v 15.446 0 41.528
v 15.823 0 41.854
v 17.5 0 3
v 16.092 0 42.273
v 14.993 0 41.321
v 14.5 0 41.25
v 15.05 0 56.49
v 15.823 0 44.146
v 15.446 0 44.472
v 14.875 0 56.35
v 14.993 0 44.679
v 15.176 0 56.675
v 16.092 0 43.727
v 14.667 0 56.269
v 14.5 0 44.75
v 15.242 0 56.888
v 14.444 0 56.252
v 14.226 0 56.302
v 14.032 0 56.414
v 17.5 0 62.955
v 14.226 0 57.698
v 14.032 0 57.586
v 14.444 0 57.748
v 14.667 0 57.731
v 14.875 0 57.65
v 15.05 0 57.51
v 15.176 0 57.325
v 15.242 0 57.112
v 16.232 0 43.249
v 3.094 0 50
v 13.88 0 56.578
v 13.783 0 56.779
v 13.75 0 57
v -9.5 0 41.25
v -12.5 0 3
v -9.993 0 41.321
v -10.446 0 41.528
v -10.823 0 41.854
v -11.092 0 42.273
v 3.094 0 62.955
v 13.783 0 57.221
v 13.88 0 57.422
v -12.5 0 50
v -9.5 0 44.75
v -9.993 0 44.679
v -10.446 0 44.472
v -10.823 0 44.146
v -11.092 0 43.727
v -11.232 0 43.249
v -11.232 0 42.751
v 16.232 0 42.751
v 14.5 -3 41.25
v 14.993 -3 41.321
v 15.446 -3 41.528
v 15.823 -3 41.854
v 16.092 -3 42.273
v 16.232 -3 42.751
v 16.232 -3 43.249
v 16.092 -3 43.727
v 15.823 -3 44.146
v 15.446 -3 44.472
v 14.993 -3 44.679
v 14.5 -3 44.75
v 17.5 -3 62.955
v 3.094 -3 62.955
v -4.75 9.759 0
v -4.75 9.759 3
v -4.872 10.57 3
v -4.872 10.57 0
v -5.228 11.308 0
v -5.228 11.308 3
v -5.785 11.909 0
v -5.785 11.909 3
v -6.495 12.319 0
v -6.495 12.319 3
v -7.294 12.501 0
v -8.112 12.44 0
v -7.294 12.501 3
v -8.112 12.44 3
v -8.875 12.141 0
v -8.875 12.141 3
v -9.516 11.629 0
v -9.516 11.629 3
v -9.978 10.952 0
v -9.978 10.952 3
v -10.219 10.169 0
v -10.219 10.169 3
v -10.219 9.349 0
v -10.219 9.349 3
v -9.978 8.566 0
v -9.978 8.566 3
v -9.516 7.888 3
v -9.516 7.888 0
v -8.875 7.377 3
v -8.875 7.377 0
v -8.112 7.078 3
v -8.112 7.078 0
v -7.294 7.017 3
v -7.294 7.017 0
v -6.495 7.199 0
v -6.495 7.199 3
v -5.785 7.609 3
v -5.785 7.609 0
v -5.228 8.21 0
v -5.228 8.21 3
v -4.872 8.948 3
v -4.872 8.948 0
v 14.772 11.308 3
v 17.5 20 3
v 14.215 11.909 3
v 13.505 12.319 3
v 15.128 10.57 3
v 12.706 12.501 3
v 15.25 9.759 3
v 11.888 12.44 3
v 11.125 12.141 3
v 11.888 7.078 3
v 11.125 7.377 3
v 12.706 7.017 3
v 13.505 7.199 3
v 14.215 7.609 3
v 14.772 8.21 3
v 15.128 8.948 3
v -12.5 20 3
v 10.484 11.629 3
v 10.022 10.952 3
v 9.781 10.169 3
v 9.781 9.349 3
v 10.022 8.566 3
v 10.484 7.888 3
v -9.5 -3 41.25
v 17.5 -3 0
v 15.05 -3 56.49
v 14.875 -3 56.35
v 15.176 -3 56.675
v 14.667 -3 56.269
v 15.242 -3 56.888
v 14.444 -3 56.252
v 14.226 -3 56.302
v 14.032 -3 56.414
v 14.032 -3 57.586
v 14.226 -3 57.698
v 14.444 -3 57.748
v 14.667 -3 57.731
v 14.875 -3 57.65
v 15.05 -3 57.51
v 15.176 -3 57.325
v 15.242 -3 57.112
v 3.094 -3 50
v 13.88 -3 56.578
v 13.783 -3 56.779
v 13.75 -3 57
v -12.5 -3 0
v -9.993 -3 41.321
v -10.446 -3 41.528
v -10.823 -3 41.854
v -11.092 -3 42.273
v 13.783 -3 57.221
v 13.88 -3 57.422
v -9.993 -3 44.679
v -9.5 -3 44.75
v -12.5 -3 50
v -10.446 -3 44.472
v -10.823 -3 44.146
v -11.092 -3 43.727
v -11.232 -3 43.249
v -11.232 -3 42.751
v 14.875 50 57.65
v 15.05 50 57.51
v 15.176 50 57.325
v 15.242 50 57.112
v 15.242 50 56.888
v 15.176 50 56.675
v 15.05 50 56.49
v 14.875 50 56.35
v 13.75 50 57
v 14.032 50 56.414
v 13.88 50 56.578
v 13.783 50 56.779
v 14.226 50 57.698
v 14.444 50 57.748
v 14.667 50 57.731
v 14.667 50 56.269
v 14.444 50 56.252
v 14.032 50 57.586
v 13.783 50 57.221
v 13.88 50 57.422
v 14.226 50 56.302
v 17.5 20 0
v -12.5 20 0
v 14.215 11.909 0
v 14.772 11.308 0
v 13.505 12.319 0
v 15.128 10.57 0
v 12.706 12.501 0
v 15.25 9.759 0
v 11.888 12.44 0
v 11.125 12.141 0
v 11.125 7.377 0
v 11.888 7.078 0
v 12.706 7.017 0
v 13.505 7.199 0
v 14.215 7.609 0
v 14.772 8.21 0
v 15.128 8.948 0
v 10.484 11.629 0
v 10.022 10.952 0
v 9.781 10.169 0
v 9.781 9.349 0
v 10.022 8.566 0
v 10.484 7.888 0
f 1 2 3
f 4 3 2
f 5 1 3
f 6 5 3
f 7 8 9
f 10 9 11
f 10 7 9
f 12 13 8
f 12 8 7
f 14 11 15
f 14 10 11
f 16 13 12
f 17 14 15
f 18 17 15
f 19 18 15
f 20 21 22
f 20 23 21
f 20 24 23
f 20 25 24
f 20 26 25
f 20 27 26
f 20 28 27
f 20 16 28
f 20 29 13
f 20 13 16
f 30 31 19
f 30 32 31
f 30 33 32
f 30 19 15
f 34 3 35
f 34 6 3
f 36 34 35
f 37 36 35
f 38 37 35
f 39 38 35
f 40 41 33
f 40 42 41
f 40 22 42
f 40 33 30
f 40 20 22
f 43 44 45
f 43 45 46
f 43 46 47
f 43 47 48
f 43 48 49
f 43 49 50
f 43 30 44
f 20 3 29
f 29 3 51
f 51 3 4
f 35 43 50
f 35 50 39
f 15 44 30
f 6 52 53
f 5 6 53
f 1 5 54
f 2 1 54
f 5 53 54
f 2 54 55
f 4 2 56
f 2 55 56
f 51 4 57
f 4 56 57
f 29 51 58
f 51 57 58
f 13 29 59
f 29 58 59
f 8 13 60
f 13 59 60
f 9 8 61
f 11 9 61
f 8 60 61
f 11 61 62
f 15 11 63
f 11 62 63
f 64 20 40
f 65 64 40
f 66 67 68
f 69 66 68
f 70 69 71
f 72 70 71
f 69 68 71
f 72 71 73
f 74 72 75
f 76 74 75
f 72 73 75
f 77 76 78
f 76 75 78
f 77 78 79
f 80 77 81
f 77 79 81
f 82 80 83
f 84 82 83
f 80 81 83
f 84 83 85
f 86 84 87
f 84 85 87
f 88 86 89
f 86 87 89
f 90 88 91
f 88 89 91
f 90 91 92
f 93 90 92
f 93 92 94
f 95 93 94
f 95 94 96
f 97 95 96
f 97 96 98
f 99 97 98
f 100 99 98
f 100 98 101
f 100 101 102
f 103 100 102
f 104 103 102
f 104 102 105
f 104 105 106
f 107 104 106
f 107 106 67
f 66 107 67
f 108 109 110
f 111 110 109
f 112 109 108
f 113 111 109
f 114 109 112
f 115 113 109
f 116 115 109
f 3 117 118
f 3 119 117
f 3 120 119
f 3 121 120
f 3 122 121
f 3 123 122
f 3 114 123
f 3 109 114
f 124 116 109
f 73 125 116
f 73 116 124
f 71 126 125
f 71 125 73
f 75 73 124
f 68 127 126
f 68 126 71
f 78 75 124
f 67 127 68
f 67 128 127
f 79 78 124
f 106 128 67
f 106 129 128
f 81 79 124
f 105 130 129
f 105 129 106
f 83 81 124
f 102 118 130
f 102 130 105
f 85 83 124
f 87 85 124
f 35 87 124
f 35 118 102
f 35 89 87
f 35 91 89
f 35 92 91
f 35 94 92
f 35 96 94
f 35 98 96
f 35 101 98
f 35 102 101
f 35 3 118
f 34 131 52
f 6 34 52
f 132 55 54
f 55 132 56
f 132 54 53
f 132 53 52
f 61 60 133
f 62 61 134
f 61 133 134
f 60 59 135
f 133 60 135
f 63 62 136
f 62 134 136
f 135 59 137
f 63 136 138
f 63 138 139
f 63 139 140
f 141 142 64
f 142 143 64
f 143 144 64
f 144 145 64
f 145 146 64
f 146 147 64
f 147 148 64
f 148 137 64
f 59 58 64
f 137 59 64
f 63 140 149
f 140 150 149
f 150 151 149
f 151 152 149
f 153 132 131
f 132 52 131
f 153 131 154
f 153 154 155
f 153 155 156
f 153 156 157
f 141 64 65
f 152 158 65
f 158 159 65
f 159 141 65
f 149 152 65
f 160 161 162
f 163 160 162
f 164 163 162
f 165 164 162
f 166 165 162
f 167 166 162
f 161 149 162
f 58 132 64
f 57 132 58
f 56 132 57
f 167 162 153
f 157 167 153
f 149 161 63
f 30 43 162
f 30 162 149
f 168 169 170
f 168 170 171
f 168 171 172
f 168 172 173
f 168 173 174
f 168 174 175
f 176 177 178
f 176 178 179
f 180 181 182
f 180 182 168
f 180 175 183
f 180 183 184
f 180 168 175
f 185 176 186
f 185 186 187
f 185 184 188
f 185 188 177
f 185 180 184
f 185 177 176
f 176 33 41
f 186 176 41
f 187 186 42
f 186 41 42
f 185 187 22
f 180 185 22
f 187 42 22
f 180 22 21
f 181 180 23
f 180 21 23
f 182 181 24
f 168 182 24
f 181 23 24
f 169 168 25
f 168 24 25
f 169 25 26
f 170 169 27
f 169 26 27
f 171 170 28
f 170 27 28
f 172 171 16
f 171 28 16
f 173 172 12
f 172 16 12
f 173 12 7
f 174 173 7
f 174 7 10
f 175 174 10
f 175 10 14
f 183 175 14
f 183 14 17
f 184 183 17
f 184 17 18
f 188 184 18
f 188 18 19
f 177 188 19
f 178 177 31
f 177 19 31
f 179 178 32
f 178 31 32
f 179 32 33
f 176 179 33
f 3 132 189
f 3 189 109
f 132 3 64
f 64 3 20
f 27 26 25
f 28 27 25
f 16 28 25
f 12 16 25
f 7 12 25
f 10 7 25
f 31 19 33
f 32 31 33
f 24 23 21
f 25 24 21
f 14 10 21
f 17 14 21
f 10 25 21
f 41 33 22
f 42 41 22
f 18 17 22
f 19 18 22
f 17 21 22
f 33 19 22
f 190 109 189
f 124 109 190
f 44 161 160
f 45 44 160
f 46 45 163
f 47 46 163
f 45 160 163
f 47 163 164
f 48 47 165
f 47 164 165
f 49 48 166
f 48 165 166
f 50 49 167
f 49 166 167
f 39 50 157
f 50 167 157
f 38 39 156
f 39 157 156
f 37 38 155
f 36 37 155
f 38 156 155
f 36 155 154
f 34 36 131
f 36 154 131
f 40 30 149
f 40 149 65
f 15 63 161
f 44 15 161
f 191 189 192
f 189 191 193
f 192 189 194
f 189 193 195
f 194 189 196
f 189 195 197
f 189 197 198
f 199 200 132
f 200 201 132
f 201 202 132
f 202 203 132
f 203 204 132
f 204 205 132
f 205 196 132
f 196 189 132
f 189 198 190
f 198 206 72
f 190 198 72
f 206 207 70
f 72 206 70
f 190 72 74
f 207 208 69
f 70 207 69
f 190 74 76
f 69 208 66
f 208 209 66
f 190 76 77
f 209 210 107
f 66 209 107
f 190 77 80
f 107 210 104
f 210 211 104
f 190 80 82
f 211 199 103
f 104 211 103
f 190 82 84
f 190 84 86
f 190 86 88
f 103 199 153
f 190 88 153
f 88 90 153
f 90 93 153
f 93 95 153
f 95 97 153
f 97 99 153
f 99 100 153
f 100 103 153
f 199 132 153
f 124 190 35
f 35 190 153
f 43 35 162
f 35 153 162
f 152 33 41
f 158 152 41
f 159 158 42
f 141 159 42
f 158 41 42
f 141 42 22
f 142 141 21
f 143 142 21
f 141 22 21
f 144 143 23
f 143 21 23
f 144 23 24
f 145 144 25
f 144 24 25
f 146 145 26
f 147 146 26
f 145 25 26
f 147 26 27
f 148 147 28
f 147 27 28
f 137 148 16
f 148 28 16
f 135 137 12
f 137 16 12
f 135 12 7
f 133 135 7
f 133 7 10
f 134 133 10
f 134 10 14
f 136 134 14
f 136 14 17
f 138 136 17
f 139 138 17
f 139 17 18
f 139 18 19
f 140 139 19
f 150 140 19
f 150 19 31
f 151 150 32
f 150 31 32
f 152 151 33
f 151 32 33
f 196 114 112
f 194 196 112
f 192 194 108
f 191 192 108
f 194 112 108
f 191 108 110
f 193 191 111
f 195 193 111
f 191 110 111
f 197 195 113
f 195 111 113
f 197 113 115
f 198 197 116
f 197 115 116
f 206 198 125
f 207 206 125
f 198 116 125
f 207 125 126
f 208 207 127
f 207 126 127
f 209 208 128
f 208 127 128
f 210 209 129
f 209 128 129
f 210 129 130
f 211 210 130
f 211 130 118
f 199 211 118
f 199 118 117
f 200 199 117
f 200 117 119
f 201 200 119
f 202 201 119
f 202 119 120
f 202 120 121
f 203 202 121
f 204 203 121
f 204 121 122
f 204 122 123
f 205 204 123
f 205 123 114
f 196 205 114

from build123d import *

# Parameters (mm, degrees)
F0_W      = 30
F0_H      = 50
F1_DEPTH  = 3
F2_W      = 30
F2_H      = 3
F3_DEPTH  = 20
F4_R      = 2.75
F5_DEPTH  = 3.001
F7_DEPTH  = 23.001
F8_W      = 14.4057143981
F8_H      = 12.954934624
F8_R      = 0.75
F9_DEPTH  = 3
F10_R     = 0.75
F11_DEPTH = 50


with BuildPart() as f1:
    # F0 (on Front) → F1 (new body)
    with BuildSketch(Plane.XZ):
        with Locations((2.5, 25)):
            Rectangle(F0_W, F0_H)
    extrude(amount=F1_DEPTH)

    # F2 (on face) → F3 (join)
    with BuildSketch(Plane(origin=(0, 0, 0), x_dir=(-1, 0, 0), z_dir=(0, 1, 0))):
        with Locations((-2.5, 1.5)):
            Rectangle(F2_W, F2_H)
    extrude(amount=F3_DEPTH)

    # F4 (on face) → F5 (cut, through all)
    with BuildSketch(Plane.XY.offset(3)):
        with Locations((12.5, 9.7589399666)):
            Circle(F4_R)
        with Locations((-7.5, 9.7589399666)):
            Circle(F4_R)
    extrude(amount=-F5_DEPTH, mode=Mode.SUBTRACT)

    # F6 (on face) → F7 (cut, through all)
    with BuildSketch(Plane.XZ.offset(3)):
        with BuildLine():
            Line((14.5, 44.75), (-9.5, 44.75))
            ThreePointArc((-9.5, 44.75), (-11.25, 43), (-9.5, 41.25))
            Line((-9.5, 41.25), (14.5, 41.25))
            ThreePointArc((14.5, 41.25), (16.25, 43), (14.5, 44.75))
        make_face()
    extrude(amount=-F7_DEPTH, mode=Mode.SUBTRACT)

    # F8 (on face) → F9 (join, through all)
    with BuildSketch(Plane(origin=(0, 0, 0), x_dir=(-1, 0, 0), z_dir=(0, 1, 0))):
        with Locations((-10.2971428009, 56.477467312)):
            Rectangle(F8_W, F8_H)
        with Locations((-14.5, 57)):
            Circle(F8_R, mode=Mode.SUBTRACT)
    extrude(amount=-F9_DEPTH)


with BuildPart() as f11:
    # F10 (on face) → F11 (new body)
    with BuildSketch(Plane(origin=(0, 0, 0), x_dir=(-1, 0, 0), z_dir=(0, 1, 0))):
        with Locations((-14.5, 57)):
            Circle(F10_R)
    extrude(amount=F11_DEPTH)


solid = Compound([f1.part, f11.part])
